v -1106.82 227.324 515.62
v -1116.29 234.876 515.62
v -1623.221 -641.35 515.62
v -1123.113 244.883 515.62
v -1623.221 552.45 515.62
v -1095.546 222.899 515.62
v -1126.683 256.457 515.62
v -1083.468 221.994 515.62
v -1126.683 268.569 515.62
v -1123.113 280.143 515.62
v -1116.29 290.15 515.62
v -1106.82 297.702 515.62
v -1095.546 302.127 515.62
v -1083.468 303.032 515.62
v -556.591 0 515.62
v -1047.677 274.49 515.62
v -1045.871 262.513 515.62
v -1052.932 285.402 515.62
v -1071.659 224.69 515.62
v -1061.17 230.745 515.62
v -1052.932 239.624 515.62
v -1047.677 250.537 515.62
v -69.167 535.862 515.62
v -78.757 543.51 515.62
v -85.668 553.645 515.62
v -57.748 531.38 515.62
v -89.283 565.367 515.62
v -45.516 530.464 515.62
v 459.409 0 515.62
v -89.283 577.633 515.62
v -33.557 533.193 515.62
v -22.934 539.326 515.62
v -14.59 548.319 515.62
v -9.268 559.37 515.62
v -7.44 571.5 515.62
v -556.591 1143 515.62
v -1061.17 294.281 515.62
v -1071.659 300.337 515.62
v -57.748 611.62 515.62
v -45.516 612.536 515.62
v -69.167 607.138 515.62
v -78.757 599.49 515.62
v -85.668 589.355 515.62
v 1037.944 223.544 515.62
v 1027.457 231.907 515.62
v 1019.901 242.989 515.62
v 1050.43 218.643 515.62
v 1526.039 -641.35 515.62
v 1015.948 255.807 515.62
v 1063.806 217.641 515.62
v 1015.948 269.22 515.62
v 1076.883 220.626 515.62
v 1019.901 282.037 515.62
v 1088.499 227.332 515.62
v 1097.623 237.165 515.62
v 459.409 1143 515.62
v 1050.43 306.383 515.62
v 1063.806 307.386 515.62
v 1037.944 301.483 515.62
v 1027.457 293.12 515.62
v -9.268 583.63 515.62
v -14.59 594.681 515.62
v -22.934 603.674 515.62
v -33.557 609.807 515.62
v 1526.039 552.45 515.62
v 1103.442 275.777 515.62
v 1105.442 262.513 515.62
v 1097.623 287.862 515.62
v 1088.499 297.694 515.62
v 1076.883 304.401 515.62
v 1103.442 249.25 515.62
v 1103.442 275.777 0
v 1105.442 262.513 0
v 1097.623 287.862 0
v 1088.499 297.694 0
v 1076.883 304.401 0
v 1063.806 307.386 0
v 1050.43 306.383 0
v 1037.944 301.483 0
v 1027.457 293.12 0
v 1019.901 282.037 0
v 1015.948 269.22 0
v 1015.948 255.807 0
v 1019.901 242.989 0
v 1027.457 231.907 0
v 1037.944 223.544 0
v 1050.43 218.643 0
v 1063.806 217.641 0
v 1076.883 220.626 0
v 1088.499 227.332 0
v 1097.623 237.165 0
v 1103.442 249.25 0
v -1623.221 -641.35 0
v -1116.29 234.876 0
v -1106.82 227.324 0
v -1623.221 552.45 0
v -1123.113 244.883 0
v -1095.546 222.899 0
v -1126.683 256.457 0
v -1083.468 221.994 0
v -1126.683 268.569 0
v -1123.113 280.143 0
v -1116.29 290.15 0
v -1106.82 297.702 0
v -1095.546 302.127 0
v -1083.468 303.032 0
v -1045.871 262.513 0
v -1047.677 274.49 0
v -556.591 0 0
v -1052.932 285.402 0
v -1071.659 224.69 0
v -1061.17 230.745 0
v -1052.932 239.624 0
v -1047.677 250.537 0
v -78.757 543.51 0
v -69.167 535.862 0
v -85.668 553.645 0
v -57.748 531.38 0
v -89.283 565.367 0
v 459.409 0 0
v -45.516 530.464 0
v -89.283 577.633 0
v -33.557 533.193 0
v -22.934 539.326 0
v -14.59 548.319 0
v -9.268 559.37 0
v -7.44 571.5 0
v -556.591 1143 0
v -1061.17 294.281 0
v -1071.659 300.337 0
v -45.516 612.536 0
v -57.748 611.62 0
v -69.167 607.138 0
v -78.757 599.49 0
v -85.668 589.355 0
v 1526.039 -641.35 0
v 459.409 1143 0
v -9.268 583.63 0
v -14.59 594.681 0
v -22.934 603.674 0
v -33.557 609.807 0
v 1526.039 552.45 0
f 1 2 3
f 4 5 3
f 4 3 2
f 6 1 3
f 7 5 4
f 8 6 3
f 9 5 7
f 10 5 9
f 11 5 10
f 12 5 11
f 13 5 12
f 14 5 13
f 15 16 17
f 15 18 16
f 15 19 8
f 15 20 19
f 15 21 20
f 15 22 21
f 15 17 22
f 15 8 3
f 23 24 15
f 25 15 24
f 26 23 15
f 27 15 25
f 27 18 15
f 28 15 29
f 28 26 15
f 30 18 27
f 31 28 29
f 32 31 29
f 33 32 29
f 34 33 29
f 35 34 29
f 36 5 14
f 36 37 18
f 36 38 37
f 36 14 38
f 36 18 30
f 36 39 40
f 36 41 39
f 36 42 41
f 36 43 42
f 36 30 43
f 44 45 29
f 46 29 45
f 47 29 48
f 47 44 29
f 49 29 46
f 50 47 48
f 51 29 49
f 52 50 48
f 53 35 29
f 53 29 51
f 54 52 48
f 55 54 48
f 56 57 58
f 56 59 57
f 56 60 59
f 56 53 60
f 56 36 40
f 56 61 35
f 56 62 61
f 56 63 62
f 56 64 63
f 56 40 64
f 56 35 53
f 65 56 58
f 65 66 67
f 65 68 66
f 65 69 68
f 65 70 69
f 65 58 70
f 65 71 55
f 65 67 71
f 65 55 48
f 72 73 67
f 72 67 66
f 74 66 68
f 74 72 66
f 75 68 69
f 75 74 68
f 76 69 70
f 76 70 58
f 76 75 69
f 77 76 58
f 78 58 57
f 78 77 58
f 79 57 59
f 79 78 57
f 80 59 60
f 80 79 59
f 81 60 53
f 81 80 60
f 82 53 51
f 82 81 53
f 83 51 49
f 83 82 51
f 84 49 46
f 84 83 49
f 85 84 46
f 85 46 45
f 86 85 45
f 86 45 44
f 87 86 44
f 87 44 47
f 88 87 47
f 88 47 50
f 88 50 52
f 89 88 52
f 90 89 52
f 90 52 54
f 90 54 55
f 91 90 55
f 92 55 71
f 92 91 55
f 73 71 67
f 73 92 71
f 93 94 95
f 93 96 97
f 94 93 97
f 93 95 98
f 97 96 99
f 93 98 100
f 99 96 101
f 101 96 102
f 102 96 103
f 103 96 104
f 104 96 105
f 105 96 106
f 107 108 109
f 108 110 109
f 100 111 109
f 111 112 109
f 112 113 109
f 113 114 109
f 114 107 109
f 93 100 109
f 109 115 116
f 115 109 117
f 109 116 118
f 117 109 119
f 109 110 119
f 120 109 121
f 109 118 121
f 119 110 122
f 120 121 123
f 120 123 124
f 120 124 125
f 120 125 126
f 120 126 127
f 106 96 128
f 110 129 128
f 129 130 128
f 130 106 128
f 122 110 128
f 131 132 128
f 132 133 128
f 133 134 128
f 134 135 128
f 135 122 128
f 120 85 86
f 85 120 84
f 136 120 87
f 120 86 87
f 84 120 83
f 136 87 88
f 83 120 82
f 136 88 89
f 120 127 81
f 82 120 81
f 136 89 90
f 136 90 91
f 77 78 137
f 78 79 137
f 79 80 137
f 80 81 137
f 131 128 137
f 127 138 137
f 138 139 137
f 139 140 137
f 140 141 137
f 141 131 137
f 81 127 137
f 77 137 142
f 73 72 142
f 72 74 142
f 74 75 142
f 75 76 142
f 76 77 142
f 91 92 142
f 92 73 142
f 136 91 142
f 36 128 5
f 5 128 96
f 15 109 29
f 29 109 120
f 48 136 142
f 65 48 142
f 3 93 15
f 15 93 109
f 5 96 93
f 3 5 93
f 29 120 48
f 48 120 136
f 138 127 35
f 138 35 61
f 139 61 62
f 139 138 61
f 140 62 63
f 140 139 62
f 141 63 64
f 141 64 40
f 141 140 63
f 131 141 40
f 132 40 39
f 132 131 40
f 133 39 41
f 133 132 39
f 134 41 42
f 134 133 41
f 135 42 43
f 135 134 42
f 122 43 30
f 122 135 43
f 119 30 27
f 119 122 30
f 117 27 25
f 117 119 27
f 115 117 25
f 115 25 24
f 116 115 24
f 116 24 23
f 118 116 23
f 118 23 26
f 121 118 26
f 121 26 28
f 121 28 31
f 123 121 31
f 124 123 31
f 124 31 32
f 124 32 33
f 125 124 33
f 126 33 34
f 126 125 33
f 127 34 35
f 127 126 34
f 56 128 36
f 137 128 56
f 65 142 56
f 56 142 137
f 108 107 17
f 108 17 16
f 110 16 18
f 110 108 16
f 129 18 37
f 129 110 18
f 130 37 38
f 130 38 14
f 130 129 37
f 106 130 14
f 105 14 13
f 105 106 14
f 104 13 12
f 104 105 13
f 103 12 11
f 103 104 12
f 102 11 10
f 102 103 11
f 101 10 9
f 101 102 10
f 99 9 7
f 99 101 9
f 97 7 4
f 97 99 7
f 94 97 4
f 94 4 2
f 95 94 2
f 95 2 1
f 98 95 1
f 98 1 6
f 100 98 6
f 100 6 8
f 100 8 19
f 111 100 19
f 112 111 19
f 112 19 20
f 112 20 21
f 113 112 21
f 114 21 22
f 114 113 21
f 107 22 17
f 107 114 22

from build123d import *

# Parameters (mm, degrees)
F0_W     = 1016
F0_H     = 1143
F0_R     = 41.151468
F0_R_2   = 40.63258
F0_R_3   = 44.998125
F1_DEPTH = 515.62


with BuildPart() as f1:
    # F0 (on Top) → F1 (new body)
    with BuildSketch(Plane.XY):
        with Locations((-48.591323, 571.5)):
            Rectangle(F0_W, F0_H)
        with Locations((-48.591323, 571.5)):
            Circle(F0_R, mode=Mode.SUBTRACT)
        Polygon((-556.591323, 0), (-556.591323, 1143), (-1623.221221, 552.45), (-1623.221221, -641.35), align=None)
        with Locations((-1086.503983, 262.51331)):
            Circle(F0_R_2, mode=Mode.SUBTRACT)
        Polygon((1526.038574, 552.45), (459.408677, 1143), (459.408677, 0), (1526.038574, -641.35), align=None)
        with Locations((1060.443401, 262.51331)):
            Circle(F0_R_3, mode=Mode.SUBTRACT)
    extrude(amount=F1_DEPTH)


solid = f1.part
